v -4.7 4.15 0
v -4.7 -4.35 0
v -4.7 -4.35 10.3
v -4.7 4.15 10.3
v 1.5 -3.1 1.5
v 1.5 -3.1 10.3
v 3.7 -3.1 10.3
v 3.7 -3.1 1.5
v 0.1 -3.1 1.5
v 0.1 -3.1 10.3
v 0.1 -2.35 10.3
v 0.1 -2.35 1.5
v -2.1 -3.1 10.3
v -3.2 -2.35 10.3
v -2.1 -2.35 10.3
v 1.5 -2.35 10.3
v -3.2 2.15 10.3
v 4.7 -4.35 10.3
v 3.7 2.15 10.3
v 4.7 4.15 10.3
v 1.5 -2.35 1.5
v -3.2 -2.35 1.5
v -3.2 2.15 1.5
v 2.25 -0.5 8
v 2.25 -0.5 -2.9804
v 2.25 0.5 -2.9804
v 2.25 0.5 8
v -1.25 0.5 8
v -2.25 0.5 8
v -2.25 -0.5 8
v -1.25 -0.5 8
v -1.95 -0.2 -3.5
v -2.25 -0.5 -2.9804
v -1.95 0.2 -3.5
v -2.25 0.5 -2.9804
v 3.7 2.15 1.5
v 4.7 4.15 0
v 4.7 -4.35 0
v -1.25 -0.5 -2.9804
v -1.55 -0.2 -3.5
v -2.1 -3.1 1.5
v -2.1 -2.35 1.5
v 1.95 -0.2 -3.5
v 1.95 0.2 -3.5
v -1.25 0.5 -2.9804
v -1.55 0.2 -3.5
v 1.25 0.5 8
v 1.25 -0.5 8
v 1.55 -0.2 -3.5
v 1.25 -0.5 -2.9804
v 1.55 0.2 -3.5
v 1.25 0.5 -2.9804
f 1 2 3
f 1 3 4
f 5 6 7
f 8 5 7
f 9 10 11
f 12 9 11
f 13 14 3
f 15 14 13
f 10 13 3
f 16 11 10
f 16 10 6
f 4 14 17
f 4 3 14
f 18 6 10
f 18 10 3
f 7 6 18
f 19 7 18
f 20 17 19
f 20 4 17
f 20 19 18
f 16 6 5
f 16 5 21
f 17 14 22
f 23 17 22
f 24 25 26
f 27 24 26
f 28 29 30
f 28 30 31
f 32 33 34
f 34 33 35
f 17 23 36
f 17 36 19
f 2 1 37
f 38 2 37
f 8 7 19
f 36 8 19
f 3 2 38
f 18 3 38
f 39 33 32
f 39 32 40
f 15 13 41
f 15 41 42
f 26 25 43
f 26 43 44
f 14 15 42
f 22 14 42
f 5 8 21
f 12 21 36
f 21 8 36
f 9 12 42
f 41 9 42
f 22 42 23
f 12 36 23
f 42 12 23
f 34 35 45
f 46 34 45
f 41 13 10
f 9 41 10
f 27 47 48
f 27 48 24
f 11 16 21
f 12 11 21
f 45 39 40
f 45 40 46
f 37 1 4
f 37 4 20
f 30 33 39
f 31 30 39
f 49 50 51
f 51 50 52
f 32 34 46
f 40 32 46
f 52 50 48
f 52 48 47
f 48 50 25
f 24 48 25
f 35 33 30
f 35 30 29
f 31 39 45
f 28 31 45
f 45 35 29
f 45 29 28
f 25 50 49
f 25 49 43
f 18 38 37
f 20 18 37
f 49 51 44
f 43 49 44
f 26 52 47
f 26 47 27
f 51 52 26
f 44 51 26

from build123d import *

# Parameters (mm, degrees)
EXTRUDE_1_DEPTH            = 8
EXTRUDE_1_DEPTH_BACK       = 3.5
SKETCH_1_W                 = 1
SKETCH_1_H                 = 1
CHAMFER_1_SIZE             = 0.3
CHAMFER_1_SIZE2            = 0.519615242
PATTERN_LINEAR_1_COUNT     = 2
PATTERN_LINEAR_1_PITCH     = 3.5
SKETCH_3_W                 = 9.4
SKETCH_3_H                 = 8.5
EXTRUDE_2_DEPTH            = 10.3
SHELL_1_T                  = -2
SHELL_1_THICKNESS_2_FACE_W = 8.3
SHELL_1_THICKNESS_2_FACE_H = 4.5
SHELL_1_THICKNESS_2_DEPTH  = 0.5
SHELL_1_THICKNESS_3_FACE_W = 4.5
SHELL_1_THICKNESS_3_FACE_H = 8.3
SHELL_1_THICKNESS_3_DEPTH  = 1
SHELL_1_THICKNESS_4_FACE_W = 6.9
SHELL_1_THICKNESS_4_FACE_H = 4.5
SHELL_1_THICKNESS_4_DEPTH  = 0.5
SKETCH_4_W                 = 2.2
SKETCH_4_H                 = 0.75
CUT_EXTRUDE_1_DEPTH        = 8.8


with BuildPart() as part:
    # Эскиз1 → Бобышка-Вытянуть1 (new, two sides: drawn at the far end of the back side and taken through both)
    with BuildSketch(Plane.XY.offset(-EXTRUDE_1_DEPTH_BACK)):
        with Locations((-1.75, 0)):
            Rectangle(SKETCH_1_W, SKETCH_1_H)
    extrude(amount=EXTRUDE_1_DEPTH + EXTRUDE_1_DEPTH_BACK)

    # Фаска1
    chamfer_1_edges = [part.edges().sort_by_distance(p)[0] for p in [
        (-2.25, 0, -3.5),
        (-1.75, -0.5, -3.5),
        (-1.25, 0, -3.5),
        (-1.75, 0.5, -3.5),
    ]]
    chamfer_1_side = [part.faces().sort_by_distance(p)[0] for p in [
        (-1.75, 0, -3.5),
    ]]
    chamfer(chamfer_1_edges, length=CHAMFER_1_SIZE, length2=CHAMFER_1_SIZE2, reference=chamfer_1_side[0])


with BuildPart() as pattern_linear_1_1:
    # Линейный массив1: pattern copy
    add(part.part.moved(Location(Vector(1, 0, 0) * (1 * PATTERN_LINEAR_1_PITCH))))


with BuildPart() as body_3:
    # Эскиз3 → Бобышка-Вытянуть2 (new body)
    with BuildSketch(Plane.XY):
        with Locations((0, -0.1)):
            Rectangle(SKETCH_3_W, SKETCH_3_H)
    extrude(amount=EXTRUDE_2_DEPTH)

    # Оболочка1
    shell_1_openings = [body_3.faces().sort_by_distance(p)[0] for p in [
        (0, -0.1, 10.3),
    ]]
    offset(amount=SHELL_1_T, openings=shell_1_openings, kind=Kind.INTERSECTION)

    # Оболочка1 thickness 2 face (on inner face of the shell) → Оболочка1 thickness 2 (cut)
    with BuildSketch(Plane(origin=(-2.7, -0.1, 6.15), x_dir=(0, 0, -1), z_dir=(-1, 0, 0))):
        Rectangle(SHELL_1_THICKNESS_2_FACE_W, SHELL_1_THICKNESS_2_FACE_H)
    extrude(amount=SHELL_1_THICKNESS_2_DEPTH, mode=Mode.SUBTRACT)

    # Оболочка1 thickness 3 face (on inner face of the shell) → Оболочка1 thickness 3 (cut)
    with BuildSketch(Plane(origin=(2.7, -0.1, 6.15), x_dir=(0, 1, 0), z_dir=(1, 0, 0))):
        Rectangle(SHELL_1_THICKNESS_3_FACE_W, SHELL_1_THICKNESS_3_FACE_H)
    extrude(amount=SHELL_1_THICKNESS_3_DEPTH, mode=Mode.SUBTRACT)

    # Оболочка1 thickness 4 face (on inner face of the shell) → Оболочка1 thickness 4 (cut)
    with BuildSketch(Plane(origin=(0.25, -0.1, 2), x_dir=(-1, 0, 0), z_dir=(0, 0, -1))):
        Rectangle(SHELL_1_THICKNESS_4_FACE_W, SHELL_1_THICKNESS_4_FACE_H)
    extrude(amount=SHELL_1_THICKNESS_4_DEPTH, mode=Mode.SUBTRACT)

    # Эскиз4 → Вырез-Вытянуть1 (cut)
    with BuildSketch(Plane.XY.offset(10.3)):
        with Locations((-1, -2.725)):
            Rectangle(SKETCH_4_W, SKETCH_4_H)
        with Locations((2.6, -2.725)):
            Rectangle(SKETCH_4_W, SKETCH_4_H)
    extrude(amount=-CUT_EXTRUDE_1_DEPTH, mode=Mode.SUBTRACT)


solid = Compound([part.part, pattern_linear_1_1.part, body_3.part])
